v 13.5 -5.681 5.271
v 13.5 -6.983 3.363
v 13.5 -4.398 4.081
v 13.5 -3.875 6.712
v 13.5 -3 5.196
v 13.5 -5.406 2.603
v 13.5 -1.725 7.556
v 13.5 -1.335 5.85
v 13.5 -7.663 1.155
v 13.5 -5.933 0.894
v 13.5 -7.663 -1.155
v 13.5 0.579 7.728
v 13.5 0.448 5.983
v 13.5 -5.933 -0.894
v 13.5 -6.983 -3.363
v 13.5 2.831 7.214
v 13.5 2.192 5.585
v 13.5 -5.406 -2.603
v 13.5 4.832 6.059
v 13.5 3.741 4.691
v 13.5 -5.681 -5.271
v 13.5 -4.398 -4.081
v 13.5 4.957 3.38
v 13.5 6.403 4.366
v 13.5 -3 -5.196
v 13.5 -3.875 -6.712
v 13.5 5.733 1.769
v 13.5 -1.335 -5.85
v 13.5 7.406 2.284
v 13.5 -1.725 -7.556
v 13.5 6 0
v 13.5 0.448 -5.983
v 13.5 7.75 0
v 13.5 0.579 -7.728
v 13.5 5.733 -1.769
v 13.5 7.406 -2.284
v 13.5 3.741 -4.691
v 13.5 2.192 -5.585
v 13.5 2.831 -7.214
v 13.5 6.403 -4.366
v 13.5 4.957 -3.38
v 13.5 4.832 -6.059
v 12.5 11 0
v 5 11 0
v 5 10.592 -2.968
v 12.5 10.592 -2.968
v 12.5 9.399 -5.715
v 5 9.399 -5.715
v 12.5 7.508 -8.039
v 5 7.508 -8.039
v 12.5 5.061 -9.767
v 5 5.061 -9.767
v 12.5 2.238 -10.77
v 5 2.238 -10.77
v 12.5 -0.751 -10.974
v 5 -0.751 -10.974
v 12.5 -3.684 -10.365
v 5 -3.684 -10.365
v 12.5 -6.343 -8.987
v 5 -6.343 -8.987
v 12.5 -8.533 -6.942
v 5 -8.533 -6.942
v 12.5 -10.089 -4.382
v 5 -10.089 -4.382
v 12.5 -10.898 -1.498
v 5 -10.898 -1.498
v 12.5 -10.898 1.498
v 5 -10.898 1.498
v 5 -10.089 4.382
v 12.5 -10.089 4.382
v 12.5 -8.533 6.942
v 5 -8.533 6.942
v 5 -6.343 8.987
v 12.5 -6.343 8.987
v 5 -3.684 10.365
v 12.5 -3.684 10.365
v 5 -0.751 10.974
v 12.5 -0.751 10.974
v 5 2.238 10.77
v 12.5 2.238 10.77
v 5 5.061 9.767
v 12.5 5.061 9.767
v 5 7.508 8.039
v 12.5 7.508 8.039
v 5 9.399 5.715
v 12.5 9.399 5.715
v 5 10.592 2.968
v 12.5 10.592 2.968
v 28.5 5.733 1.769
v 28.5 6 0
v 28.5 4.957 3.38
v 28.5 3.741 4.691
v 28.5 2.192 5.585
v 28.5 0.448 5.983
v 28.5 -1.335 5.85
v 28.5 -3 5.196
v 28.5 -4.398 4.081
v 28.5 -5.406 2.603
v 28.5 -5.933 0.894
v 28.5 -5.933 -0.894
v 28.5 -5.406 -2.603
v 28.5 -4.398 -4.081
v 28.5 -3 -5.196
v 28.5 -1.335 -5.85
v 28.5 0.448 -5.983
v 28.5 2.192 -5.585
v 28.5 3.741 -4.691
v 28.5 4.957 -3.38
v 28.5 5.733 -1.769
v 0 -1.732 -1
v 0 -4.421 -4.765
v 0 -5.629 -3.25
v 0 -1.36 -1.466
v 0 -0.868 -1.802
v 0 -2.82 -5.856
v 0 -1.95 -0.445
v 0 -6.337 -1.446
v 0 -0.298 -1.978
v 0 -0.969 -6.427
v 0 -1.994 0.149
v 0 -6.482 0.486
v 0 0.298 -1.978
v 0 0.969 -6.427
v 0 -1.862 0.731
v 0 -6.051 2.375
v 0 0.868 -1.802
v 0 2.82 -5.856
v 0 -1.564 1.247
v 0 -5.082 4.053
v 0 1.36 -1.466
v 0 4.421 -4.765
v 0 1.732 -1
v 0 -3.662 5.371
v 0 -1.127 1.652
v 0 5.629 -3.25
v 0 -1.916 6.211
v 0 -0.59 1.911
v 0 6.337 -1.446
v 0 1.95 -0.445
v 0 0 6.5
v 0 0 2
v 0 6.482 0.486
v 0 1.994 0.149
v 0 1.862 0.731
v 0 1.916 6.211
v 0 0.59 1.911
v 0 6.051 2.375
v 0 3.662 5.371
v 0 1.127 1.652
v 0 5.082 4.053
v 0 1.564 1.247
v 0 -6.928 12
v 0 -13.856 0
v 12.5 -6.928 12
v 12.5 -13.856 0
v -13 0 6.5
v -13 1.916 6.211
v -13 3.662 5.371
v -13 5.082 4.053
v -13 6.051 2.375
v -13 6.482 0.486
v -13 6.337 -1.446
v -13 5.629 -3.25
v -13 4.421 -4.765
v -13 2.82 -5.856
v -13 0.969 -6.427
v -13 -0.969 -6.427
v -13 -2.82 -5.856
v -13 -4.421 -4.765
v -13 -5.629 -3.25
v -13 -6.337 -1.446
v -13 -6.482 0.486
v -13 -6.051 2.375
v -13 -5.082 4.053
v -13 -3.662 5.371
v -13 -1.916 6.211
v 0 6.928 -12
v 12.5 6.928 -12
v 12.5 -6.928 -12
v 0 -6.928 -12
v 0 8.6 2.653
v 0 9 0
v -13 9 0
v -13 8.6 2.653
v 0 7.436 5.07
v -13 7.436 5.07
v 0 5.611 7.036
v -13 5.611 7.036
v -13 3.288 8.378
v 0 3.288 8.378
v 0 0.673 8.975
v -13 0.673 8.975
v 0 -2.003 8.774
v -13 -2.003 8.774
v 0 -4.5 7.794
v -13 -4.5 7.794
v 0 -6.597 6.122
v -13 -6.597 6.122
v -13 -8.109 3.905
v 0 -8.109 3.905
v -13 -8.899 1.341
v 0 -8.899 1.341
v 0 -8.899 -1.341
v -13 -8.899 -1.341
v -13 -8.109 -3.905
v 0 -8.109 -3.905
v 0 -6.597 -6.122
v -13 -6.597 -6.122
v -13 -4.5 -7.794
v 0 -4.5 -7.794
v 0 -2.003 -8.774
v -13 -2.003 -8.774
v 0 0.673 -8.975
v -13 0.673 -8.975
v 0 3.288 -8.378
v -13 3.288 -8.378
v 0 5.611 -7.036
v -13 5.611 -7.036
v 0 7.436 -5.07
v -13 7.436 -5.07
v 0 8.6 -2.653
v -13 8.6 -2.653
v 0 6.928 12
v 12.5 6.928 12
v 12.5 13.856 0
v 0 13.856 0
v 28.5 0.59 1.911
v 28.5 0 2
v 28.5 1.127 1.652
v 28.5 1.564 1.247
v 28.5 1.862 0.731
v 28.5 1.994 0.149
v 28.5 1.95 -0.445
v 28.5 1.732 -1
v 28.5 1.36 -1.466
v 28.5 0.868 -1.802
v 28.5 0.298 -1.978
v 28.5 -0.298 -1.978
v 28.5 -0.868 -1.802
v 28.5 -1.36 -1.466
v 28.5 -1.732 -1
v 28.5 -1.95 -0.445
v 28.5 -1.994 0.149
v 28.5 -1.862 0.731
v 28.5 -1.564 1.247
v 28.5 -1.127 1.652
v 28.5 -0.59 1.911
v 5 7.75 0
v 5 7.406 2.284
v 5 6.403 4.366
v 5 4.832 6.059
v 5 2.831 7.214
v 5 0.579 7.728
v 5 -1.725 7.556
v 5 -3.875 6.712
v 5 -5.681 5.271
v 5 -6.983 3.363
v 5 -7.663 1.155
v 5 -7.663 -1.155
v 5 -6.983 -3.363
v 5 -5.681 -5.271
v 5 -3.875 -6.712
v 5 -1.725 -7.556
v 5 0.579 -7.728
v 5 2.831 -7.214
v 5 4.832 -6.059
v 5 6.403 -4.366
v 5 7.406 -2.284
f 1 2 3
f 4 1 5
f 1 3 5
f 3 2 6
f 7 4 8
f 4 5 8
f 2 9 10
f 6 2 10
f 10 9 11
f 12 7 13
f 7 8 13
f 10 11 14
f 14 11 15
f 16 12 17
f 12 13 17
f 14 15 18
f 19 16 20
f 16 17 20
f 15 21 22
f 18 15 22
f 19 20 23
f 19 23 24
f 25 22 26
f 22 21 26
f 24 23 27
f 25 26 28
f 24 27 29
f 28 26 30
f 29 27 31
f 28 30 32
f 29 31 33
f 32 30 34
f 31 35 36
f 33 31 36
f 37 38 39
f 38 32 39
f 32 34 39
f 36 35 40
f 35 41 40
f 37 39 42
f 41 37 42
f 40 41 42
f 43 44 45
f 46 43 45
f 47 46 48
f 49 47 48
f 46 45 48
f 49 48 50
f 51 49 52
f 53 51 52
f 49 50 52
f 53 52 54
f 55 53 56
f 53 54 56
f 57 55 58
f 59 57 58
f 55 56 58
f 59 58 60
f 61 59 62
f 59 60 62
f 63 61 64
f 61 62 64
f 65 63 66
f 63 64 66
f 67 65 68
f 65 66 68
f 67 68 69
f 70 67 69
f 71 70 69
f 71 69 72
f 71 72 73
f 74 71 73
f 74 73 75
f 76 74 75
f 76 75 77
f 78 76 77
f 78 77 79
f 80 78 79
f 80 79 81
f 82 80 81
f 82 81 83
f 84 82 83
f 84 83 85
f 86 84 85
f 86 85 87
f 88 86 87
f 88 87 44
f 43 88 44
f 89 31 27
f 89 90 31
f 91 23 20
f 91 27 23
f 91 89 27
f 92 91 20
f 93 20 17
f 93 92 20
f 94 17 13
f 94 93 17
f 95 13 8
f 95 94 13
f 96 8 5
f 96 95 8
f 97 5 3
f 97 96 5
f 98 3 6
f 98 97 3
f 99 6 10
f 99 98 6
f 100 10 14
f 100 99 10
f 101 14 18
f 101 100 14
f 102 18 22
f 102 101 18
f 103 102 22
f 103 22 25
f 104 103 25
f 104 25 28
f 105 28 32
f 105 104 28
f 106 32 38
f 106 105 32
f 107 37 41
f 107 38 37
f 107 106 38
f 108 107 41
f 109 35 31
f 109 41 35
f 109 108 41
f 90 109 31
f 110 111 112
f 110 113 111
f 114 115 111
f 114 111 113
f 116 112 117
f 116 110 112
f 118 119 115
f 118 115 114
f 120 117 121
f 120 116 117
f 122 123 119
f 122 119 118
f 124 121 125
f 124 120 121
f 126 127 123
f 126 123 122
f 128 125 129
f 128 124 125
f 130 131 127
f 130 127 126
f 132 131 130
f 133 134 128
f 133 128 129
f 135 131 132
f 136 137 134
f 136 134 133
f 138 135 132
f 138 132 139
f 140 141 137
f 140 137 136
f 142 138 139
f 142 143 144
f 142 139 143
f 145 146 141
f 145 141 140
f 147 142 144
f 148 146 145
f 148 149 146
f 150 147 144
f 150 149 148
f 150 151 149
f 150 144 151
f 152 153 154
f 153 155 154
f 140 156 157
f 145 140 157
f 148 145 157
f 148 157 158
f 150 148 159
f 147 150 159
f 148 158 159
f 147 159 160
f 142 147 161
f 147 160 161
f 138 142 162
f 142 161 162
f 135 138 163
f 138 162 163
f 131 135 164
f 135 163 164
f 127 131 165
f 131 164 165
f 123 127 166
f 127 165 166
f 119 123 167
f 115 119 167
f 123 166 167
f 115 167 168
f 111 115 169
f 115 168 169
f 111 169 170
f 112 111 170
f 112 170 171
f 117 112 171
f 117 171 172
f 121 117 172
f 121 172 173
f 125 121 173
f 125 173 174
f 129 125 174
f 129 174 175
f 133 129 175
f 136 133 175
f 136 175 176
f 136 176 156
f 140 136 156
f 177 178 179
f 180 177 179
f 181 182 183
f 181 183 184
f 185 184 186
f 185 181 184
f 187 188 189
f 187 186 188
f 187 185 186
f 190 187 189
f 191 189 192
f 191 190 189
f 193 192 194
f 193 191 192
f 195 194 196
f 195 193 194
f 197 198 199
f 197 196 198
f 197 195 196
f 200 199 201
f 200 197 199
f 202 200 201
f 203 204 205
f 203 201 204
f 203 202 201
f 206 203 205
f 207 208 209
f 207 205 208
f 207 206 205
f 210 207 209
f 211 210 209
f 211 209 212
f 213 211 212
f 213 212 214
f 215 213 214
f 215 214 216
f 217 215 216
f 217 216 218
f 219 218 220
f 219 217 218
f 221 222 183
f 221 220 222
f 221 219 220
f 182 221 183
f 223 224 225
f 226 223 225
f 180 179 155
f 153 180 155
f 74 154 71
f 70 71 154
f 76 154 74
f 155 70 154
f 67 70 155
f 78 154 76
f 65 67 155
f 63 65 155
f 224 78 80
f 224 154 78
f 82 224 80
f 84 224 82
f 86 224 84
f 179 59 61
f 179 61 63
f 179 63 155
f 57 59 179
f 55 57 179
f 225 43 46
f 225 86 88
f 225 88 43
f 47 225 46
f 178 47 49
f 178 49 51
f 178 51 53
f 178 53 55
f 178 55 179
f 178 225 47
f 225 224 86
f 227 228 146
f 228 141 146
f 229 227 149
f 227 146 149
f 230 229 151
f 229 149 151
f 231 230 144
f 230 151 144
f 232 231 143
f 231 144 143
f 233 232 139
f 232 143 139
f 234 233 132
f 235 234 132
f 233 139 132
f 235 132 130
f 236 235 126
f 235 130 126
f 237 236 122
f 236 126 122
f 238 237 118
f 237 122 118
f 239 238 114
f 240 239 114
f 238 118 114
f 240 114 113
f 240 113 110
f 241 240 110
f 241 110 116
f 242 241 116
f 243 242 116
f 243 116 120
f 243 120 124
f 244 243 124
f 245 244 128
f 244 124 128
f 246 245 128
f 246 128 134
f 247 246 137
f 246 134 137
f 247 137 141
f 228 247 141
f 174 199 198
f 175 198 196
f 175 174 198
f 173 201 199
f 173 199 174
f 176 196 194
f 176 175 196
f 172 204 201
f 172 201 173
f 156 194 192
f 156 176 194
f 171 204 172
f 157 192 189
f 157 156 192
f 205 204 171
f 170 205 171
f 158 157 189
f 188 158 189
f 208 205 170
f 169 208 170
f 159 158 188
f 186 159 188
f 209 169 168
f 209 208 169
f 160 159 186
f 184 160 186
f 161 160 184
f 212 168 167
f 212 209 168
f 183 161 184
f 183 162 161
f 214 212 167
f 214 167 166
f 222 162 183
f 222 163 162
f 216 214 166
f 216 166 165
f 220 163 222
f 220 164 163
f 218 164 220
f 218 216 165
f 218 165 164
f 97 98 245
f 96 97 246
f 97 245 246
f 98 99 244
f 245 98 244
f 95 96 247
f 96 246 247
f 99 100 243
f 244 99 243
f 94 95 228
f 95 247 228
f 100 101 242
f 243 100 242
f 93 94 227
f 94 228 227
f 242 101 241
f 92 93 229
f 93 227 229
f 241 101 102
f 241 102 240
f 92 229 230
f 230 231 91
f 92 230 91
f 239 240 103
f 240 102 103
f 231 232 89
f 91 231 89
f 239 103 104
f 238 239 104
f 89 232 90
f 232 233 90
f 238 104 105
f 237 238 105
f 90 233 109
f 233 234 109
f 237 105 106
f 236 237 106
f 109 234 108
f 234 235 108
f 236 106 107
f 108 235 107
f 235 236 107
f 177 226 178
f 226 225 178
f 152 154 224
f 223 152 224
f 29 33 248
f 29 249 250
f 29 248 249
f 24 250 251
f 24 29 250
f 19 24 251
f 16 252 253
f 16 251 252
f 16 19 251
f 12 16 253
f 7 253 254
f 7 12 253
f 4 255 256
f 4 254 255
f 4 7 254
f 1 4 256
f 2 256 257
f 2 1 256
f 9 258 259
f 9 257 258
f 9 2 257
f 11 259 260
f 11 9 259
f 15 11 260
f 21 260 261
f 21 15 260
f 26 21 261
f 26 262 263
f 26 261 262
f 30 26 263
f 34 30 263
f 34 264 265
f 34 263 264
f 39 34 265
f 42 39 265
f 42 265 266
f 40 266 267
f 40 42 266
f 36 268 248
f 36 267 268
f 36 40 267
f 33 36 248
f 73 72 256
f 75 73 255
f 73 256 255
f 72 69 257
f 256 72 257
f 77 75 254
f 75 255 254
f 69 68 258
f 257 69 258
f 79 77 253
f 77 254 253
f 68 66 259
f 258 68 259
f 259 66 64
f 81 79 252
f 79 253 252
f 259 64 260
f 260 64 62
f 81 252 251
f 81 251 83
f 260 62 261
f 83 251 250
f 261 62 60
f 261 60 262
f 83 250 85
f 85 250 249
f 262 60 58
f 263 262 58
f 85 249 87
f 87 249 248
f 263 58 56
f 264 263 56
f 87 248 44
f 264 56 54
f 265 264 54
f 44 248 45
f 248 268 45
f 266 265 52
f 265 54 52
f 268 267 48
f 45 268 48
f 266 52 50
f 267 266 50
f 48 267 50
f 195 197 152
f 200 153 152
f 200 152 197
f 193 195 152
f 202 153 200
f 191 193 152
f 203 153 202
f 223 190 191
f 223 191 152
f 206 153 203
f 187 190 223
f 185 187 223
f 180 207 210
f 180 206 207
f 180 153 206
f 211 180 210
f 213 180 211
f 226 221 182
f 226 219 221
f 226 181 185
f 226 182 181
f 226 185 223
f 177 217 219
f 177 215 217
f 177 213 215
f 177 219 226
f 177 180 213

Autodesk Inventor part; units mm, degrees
ref_plane "YZ Plane" through (0, 0, 0) normal (1, 0, 0) x (0, 1, 0)
ref_plane "XZ Plane" through (0, 0, 0) normal (0, 1, 0) x (-1, 0, 0)
ref_plane "XY Plane" through (0, 0, 0) normal (0, 0, 1) x (1, 0, 0)
sketch "Sketch1" plane through (0, 0, 0) normal (0, 0, 1) x (1, 0, 0)
  line L0 (0, 0) -> (-13, 0)
  line L1 (-13, 0) -> (-13, 9)
  line L2 (-13, 9) -> (0, 9)
  line L3 (0, 9) -> (0, 12)
  line L4 (0, 12) -> (12.5, 12)
  line L5 (12.5, 12) -> (12.5, 11)
  line L6 (12.5, 11) -> (5, 11)
  line L7 (5, 11) -> (5, 7.75)
  line L8 (5, 7.75) -> (13.5, 7.75)
  line L9 (13.5, 7.75) -> (13.5, 6)
  line L10 (13.5, 6) -> (28.5, 6)
  line L11 (28.5, 6) -> (28.5, 0)
  line L12 (28.5, 0) -> (0, 0)
  dimension "d0" = 13
  dimension "d1" = 9
  dimension "d2" = 13
  dimension "d3" = 3
  dimension "d4" = 12.5
  dimension "d5" = 1
  dimension "d6" = 7.5
  dimension "d7" = 3.25
  dimension "d8" = 8.5
  dimension "d9" = 1.75
  dimension "d10" = 15
revolve "Revolution1" add sketch "Sketch1" angle 360 about axis through (28.5, 0, 0) along (-1, 0, 0)
sketch "Sketch2" plane through (12.5, 0, 0) normal (1, 0, 0) x (0, 0, -1)
  circle A0 centre (0, 0) radius 12 projected
  line L0 (12, -6.9282) -> (0, -13.8564)
  line L1 (0, -13.8564) -> (-12, -6.9282)
  line L2 (-12, -6.9282) -> (-12, 6.9282)
  line L3 (-12, 6.9282) -> (0, 13.8564)
  line L4 (0, 13.8564) -> (12, 6.9282)
  line L5 (12, 6.9282) -> (12, -6.9282)
  circle A1 centre (0, 0) radius 11
  point P0 (12, 0)
  point P1 (6, 10.3923)
  point P2 (6, -10.3923)
  point P3 (-6, 10.3923)
  point P4 (-12, 0)
  point P5 (-6, -10.3923)
  dimension "d12" = 24
  dimension "d13" = 0
extrude "Extrusion1" add sketch "Sketch2" against normal blind 12.5 contours L5 L0 A0 | A0 L4 L5 | A0 L3 L4 | L0 L1 A0 | A0 L2 L3 | L1 L2 A0
thread "Thread1" size "M18x1" class "6g" standard "ANSI Metric M Profile" length 7 offset 6.5
sketch "Sketch3" plane through (-13, 0, 0) normal (-1, 0, 0) x (0, 0, 1)
  circle A0 centre (0, 0) radius 7.75 projected
  circle A1 centre (0, 0) radius 6.5
  dimension "d18" = 13
extrude "Extrusion2" cut sketch "Sketch3" against normal blind 13 contours A1
sketch "Sketch4" plane through (0, 0, 0) normal (-1, 0, 0) x (0, 0, 1)
  circle A0 centre (0, 0) radius 2
  dimension "d21" = 4
extrude "Extrusion3" cut sketch "Sketch4" against normal through all
thread "Thread2" size "M4x0.7" class "6H" standard "ANSI Metric M Profile" length 28.5
properties part number "HEX HUB ver 1"
